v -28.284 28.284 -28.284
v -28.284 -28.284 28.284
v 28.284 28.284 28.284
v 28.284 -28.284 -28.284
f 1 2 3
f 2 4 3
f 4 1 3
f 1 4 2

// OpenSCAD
module tetrahedron (diag) {
    polyhedron
    ( points =
        [ [ diag/2,  diag/2,  diag/2]
        , [-diag/2, -diag/2,  diag/2]
        , [-diag/2,  diag/2, -diag/2]
        , [ diag/2, -diag/2, -diag/2]
        ]
    , triangles =
        [ [0, 1, 2]
        , [0, 3, 1]
        , [0, 2, 3]
        , [1, 3, 2]
        ]
    );
}

tetrahedron (80 / pow (2, 0.5));
